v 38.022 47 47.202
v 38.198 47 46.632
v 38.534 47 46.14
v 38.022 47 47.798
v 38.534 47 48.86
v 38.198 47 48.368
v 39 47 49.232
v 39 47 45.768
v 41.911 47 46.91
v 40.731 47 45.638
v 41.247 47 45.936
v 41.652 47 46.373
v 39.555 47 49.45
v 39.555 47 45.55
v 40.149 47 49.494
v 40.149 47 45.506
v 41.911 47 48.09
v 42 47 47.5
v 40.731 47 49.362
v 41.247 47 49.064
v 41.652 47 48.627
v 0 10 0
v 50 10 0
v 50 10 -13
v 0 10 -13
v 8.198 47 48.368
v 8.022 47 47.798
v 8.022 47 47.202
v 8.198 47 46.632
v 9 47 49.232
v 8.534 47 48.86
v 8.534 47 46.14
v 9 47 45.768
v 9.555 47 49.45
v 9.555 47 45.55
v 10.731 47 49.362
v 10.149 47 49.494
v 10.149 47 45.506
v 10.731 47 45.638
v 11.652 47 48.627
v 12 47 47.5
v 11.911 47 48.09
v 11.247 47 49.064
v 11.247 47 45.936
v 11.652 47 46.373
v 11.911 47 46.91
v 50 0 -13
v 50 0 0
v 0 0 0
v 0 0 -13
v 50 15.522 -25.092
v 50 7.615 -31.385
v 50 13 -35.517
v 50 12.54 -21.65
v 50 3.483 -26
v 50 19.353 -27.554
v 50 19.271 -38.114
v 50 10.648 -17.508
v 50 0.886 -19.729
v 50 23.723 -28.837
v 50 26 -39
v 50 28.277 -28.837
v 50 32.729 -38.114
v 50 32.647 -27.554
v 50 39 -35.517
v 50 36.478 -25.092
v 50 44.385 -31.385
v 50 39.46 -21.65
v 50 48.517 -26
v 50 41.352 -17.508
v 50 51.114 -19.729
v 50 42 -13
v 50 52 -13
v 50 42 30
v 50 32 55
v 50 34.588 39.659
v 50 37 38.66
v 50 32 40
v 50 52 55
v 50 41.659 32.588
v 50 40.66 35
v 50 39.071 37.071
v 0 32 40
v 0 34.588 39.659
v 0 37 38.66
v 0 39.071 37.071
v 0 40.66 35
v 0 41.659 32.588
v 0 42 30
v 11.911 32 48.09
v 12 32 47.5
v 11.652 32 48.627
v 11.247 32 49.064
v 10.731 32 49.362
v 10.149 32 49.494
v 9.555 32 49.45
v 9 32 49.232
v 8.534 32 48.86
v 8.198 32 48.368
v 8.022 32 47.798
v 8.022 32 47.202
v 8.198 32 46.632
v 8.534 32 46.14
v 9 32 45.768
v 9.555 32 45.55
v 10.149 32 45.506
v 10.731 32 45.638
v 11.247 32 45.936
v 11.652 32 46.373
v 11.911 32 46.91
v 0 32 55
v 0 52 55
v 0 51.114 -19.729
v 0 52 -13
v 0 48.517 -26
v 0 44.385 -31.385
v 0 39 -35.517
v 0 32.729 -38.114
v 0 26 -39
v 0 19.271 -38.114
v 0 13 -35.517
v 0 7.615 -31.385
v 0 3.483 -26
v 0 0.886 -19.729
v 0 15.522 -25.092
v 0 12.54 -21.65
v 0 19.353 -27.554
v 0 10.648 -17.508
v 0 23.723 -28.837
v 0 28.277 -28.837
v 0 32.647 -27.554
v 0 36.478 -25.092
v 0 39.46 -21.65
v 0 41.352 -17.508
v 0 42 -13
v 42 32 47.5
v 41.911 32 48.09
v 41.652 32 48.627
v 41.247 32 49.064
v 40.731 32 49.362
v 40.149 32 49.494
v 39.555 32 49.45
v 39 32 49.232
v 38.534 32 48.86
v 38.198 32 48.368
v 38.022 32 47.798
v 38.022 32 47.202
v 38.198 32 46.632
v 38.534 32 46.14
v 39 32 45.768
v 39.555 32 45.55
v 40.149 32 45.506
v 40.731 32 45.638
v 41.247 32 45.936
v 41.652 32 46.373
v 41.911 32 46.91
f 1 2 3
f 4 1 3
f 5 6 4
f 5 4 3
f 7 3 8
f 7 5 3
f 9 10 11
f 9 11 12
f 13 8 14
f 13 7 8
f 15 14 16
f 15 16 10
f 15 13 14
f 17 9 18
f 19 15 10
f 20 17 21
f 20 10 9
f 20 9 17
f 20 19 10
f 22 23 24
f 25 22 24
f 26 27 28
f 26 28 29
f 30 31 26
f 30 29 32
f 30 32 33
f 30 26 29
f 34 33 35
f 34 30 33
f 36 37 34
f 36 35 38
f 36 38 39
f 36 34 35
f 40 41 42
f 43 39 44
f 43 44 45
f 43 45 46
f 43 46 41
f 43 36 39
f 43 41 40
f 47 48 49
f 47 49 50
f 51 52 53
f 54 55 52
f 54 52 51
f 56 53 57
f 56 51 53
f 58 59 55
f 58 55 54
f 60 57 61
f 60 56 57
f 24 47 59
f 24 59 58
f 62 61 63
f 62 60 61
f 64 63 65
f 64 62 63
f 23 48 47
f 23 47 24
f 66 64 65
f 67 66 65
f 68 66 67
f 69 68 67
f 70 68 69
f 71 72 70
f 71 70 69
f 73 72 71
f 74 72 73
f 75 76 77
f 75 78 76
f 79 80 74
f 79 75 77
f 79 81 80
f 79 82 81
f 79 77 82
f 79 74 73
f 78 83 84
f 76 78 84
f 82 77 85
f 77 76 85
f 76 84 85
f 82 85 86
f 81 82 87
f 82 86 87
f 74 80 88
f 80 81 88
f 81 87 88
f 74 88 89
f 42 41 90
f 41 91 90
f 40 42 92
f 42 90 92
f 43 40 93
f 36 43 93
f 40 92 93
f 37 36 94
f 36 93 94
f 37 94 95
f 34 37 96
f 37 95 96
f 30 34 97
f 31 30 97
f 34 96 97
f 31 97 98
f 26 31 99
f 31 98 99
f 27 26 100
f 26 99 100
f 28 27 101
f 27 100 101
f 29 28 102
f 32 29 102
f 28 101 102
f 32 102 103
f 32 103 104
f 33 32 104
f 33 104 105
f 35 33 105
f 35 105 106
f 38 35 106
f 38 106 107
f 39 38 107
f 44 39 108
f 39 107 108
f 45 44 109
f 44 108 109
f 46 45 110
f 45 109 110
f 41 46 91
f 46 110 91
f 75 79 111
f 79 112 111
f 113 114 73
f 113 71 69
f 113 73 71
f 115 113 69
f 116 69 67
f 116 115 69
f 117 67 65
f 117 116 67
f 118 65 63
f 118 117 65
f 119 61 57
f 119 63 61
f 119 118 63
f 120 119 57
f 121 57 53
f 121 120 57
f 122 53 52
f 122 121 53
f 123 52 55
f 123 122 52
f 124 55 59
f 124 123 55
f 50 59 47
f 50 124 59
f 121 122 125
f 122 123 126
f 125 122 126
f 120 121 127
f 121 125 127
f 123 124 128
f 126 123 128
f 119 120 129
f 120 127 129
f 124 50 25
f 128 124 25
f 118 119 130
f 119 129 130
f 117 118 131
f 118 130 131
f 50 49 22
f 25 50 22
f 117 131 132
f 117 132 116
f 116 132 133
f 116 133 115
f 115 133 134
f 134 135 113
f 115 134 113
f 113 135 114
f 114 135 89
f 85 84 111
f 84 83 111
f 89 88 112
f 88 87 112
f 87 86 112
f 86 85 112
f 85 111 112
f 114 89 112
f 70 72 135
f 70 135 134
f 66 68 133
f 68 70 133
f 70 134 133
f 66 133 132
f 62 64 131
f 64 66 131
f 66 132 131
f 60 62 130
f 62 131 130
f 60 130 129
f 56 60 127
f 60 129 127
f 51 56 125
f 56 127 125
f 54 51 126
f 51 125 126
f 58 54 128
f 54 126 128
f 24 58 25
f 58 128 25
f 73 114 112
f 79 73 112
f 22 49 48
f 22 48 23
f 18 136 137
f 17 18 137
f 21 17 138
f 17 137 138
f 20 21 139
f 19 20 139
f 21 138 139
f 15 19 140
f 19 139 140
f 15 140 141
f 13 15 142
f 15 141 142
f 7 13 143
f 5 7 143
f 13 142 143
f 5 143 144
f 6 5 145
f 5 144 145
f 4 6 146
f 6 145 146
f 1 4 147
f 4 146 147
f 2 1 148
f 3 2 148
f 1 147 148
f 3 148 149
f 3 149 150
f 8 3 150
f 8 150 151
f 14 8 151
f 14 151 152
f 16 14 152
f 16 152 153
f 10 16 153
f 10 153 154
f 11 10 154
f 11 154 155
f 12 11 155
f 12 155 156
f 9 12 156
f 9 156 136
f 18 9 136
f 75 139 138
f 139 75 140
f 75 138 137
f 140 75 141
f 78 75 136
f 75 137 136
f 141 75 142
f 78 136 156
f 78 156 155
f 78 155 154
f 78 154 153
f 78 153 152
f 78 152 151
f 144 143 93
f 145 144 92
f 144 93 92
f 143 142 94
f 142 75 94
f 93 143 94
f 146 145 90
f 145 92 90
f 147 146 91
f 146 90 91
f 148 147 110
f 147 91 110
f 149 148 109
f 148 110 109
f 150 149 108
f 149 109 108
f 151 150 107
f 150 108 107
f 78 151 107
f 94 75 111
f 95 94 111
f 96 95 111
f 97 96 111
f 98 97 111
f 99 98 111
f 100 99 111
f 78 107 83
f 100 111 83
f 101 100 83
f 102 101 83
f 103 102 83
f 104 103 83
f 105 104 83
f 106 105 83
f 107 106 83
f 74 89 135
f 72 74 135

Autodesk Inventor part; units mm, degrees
ref_plane "YZ Plane" through (0, 0, 0) normal (1, 0, 0) x (0, 1, 0)
ref_plane "XZ Plane" through (0, 0, 0) normal (0, 1, 0) x (-1, 0, 0)
ref_plane "XY Plane" through (0, 0, 0) normal (0, 0, 1) x (1, 0, 0)
sketch "Sketch1" plane through (0, 0, 0) normal (1, 0, 0) x (0, 1, 0)
  line L0 (10, 0) -> (10, -13)
  line L1 (0, 0) -> (0, -13)
  line L2 (52, -13) -> (52, 55)
  line L3 (52, 55) -> (32, 55)
  line L4 (52, 55) -> (72, 55) construction
  line L5 (32, 55) -> (32, 40)
  line L6 (32, 55) -> (47, 55) construction
  line L7 (32, 40) -> (32, 40)
  line L8 (42, 30) -> (42, -13)
  arc A0 (42, 30) -> (32, 40) centre (32, 30) ccw
  arc A1 (10, -13) -> (42, -13) centre (26, -13) ccw
  arc A2 (0, -13) -> (52, -13) centre (26, -13) ccw
  line L9 (0, 0) -> (10, 0)
  dimension "d2" = 13
  dimension "d7" = 13
  dimension "d12" = 68
  dimension "d14" = 20
  dimension "d16" = 15
  dimension "d19" = 10
  dimension "d20" = 16
  dimension "d21" = 26
  dimension "d22" = 10
extrude "Extrusion1" add sketch "Sketch1" along normal blind 50
sketch "Sketch2" plane through (0, 32, 40) normal (0, -1, 0) x (1, 0, 0)
  circle A0 centre (10, 7.5) radius 2
  line L0 (0, 15) -> (0, 0) projected
  line L1 (0, 15) -> (50, 15) projected
  circle A1 centre (40, 7.5) radius 2
  point P0 (0, -40)
  dimension "d25" = 4
  dimension "d26" = 10
  dimension "d27" = 7.5
  dimension "d30" = 30
extrude "Extrusion2" cut sketch "Sketch2" against normal blind 15
properties part number "lid_holder"
